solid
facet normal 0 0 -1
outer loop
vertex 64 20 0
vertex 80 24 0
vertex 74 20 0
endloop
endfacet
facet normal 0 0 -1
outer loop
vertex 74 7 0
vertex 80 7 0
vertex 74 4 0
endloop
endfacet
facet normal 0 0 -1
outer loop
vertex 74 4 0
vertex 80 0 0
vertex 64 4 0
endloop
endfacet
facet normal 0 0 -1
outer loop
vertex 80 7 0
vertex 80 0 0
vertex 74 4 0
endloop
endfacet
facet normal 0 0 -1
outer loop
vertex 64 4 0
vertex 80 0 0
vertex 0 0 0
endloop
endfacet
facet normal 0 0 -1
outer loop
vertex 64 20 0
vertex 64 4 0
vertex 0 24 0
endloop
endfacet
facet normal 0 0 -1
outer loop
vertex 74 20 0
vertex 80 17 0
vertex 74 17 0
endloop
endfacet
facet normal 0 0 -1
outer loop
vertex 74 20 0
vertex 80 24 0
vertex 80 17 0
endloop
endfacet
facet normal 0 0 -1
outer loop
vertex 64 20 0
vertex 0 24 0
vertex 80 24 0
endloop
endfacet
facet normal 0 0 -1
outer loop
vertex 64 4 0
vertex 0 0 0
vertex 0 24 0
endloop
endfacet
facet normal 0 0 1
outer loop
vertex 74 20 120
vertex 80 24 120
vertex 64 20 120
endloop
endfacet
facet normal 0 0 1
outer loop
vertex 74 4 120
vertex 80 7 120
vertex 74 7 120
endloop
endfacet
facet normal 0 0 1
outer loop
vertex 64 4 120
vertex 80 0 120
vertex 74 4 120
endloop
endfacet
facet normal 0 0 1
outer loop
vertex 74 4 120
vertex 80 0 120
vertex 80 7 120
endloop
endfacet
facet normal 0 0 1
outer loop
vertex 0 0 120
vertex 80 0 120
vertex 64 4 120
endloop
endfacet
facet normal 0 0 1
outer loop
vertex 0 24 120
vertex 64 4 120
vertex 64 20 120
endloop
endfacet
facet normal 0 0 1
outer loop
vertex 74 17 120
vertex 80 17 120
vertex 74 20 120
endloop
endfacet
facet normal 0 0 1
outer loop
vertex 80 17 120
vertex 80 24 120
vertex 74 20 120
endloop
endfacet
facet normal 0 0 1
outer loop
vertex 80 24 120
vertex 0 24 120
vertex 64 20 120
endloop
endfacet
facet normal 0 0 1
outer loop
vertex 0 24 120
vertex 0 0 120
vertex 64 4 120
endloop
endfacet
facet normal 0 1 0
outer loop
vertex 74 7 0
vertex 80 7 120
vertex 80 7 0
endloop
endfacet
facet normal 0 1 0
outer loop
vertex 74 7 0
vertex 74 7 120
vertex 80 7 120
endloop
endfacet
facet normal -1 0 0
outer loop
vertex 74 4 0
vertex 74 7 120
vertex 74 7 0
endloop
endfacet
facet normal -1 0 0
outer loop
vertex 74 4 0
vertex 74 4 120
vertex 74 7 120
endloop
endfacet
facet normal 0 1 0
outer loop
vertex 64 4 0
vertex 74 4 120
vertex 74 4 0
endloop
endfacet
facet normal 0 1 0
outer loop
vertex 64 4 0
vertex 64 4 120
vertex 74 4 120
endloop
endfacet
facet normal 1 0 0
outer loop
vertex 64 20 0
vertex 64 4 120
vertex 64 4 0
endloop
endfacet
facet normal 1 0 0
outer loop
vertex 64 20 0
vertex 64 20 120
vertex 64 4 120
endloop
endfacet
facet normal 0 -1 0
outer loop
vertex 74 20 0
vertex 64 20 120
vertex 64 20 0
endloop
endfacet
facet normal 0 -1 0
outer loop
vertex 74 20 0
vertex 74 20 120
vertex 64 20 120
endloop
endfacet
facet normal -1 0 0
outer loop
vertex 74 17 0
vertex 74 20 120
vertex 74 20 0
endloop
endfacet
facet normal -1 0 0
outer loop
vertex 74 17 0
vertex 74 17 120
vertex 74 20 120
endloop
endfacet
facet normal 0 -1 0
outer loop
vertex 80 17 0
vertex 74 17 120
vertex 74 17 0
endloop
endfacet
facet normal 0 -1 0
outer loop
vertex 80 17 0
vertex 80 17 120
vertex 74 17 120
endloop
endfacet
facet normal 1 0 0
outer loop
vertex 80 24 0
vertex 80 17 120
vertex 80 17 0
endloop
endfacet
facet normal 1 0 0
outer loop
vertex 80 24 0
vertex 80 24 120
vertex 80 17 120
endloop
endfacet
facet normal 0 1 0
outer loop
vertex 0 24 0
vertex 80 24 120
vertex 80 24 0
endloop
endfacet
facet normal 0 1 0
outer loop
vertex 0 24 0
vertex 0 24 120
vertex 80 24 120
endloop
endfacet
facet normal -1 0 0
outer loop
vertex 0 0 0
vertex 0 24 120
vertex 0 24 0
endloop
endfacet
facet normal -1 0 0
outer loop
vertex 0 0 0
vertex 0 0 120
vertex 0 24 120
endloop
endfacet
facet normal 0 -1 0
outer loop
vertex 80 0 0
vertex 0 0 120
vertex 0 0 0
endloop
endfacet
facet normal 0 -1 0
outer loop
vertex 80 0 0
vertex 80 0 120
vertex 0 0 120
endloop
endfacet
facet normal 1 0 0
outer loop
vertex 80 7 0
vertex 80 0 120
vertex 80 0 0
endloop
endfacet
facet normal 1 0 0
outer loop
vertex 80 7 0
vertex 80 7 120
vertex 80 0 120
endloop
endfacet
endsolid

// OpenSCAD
$fn = 32;

// ----------------------------------------------------------------------
// T-slot rail: 80 x 24 mm section, 120 mm long
// ----------------------------------------------------------------------

// --- parameters (mm) ---
profile_height = 120;     // extrusion height
profile_points = 12;      // points of the closed outline

profile = [[0, 0], [80, 0], [80, 7], [74, 7], [74, 4], [64, 4], [64, 20], [74, 20], [74, 17], [80, 17], [80, 24], [0, 24]];  // single closed polygon, 12 points, counter clockwise

// --- the one profile operation ---
linear_extrude(height = profile_height) polygon(points = profile);
